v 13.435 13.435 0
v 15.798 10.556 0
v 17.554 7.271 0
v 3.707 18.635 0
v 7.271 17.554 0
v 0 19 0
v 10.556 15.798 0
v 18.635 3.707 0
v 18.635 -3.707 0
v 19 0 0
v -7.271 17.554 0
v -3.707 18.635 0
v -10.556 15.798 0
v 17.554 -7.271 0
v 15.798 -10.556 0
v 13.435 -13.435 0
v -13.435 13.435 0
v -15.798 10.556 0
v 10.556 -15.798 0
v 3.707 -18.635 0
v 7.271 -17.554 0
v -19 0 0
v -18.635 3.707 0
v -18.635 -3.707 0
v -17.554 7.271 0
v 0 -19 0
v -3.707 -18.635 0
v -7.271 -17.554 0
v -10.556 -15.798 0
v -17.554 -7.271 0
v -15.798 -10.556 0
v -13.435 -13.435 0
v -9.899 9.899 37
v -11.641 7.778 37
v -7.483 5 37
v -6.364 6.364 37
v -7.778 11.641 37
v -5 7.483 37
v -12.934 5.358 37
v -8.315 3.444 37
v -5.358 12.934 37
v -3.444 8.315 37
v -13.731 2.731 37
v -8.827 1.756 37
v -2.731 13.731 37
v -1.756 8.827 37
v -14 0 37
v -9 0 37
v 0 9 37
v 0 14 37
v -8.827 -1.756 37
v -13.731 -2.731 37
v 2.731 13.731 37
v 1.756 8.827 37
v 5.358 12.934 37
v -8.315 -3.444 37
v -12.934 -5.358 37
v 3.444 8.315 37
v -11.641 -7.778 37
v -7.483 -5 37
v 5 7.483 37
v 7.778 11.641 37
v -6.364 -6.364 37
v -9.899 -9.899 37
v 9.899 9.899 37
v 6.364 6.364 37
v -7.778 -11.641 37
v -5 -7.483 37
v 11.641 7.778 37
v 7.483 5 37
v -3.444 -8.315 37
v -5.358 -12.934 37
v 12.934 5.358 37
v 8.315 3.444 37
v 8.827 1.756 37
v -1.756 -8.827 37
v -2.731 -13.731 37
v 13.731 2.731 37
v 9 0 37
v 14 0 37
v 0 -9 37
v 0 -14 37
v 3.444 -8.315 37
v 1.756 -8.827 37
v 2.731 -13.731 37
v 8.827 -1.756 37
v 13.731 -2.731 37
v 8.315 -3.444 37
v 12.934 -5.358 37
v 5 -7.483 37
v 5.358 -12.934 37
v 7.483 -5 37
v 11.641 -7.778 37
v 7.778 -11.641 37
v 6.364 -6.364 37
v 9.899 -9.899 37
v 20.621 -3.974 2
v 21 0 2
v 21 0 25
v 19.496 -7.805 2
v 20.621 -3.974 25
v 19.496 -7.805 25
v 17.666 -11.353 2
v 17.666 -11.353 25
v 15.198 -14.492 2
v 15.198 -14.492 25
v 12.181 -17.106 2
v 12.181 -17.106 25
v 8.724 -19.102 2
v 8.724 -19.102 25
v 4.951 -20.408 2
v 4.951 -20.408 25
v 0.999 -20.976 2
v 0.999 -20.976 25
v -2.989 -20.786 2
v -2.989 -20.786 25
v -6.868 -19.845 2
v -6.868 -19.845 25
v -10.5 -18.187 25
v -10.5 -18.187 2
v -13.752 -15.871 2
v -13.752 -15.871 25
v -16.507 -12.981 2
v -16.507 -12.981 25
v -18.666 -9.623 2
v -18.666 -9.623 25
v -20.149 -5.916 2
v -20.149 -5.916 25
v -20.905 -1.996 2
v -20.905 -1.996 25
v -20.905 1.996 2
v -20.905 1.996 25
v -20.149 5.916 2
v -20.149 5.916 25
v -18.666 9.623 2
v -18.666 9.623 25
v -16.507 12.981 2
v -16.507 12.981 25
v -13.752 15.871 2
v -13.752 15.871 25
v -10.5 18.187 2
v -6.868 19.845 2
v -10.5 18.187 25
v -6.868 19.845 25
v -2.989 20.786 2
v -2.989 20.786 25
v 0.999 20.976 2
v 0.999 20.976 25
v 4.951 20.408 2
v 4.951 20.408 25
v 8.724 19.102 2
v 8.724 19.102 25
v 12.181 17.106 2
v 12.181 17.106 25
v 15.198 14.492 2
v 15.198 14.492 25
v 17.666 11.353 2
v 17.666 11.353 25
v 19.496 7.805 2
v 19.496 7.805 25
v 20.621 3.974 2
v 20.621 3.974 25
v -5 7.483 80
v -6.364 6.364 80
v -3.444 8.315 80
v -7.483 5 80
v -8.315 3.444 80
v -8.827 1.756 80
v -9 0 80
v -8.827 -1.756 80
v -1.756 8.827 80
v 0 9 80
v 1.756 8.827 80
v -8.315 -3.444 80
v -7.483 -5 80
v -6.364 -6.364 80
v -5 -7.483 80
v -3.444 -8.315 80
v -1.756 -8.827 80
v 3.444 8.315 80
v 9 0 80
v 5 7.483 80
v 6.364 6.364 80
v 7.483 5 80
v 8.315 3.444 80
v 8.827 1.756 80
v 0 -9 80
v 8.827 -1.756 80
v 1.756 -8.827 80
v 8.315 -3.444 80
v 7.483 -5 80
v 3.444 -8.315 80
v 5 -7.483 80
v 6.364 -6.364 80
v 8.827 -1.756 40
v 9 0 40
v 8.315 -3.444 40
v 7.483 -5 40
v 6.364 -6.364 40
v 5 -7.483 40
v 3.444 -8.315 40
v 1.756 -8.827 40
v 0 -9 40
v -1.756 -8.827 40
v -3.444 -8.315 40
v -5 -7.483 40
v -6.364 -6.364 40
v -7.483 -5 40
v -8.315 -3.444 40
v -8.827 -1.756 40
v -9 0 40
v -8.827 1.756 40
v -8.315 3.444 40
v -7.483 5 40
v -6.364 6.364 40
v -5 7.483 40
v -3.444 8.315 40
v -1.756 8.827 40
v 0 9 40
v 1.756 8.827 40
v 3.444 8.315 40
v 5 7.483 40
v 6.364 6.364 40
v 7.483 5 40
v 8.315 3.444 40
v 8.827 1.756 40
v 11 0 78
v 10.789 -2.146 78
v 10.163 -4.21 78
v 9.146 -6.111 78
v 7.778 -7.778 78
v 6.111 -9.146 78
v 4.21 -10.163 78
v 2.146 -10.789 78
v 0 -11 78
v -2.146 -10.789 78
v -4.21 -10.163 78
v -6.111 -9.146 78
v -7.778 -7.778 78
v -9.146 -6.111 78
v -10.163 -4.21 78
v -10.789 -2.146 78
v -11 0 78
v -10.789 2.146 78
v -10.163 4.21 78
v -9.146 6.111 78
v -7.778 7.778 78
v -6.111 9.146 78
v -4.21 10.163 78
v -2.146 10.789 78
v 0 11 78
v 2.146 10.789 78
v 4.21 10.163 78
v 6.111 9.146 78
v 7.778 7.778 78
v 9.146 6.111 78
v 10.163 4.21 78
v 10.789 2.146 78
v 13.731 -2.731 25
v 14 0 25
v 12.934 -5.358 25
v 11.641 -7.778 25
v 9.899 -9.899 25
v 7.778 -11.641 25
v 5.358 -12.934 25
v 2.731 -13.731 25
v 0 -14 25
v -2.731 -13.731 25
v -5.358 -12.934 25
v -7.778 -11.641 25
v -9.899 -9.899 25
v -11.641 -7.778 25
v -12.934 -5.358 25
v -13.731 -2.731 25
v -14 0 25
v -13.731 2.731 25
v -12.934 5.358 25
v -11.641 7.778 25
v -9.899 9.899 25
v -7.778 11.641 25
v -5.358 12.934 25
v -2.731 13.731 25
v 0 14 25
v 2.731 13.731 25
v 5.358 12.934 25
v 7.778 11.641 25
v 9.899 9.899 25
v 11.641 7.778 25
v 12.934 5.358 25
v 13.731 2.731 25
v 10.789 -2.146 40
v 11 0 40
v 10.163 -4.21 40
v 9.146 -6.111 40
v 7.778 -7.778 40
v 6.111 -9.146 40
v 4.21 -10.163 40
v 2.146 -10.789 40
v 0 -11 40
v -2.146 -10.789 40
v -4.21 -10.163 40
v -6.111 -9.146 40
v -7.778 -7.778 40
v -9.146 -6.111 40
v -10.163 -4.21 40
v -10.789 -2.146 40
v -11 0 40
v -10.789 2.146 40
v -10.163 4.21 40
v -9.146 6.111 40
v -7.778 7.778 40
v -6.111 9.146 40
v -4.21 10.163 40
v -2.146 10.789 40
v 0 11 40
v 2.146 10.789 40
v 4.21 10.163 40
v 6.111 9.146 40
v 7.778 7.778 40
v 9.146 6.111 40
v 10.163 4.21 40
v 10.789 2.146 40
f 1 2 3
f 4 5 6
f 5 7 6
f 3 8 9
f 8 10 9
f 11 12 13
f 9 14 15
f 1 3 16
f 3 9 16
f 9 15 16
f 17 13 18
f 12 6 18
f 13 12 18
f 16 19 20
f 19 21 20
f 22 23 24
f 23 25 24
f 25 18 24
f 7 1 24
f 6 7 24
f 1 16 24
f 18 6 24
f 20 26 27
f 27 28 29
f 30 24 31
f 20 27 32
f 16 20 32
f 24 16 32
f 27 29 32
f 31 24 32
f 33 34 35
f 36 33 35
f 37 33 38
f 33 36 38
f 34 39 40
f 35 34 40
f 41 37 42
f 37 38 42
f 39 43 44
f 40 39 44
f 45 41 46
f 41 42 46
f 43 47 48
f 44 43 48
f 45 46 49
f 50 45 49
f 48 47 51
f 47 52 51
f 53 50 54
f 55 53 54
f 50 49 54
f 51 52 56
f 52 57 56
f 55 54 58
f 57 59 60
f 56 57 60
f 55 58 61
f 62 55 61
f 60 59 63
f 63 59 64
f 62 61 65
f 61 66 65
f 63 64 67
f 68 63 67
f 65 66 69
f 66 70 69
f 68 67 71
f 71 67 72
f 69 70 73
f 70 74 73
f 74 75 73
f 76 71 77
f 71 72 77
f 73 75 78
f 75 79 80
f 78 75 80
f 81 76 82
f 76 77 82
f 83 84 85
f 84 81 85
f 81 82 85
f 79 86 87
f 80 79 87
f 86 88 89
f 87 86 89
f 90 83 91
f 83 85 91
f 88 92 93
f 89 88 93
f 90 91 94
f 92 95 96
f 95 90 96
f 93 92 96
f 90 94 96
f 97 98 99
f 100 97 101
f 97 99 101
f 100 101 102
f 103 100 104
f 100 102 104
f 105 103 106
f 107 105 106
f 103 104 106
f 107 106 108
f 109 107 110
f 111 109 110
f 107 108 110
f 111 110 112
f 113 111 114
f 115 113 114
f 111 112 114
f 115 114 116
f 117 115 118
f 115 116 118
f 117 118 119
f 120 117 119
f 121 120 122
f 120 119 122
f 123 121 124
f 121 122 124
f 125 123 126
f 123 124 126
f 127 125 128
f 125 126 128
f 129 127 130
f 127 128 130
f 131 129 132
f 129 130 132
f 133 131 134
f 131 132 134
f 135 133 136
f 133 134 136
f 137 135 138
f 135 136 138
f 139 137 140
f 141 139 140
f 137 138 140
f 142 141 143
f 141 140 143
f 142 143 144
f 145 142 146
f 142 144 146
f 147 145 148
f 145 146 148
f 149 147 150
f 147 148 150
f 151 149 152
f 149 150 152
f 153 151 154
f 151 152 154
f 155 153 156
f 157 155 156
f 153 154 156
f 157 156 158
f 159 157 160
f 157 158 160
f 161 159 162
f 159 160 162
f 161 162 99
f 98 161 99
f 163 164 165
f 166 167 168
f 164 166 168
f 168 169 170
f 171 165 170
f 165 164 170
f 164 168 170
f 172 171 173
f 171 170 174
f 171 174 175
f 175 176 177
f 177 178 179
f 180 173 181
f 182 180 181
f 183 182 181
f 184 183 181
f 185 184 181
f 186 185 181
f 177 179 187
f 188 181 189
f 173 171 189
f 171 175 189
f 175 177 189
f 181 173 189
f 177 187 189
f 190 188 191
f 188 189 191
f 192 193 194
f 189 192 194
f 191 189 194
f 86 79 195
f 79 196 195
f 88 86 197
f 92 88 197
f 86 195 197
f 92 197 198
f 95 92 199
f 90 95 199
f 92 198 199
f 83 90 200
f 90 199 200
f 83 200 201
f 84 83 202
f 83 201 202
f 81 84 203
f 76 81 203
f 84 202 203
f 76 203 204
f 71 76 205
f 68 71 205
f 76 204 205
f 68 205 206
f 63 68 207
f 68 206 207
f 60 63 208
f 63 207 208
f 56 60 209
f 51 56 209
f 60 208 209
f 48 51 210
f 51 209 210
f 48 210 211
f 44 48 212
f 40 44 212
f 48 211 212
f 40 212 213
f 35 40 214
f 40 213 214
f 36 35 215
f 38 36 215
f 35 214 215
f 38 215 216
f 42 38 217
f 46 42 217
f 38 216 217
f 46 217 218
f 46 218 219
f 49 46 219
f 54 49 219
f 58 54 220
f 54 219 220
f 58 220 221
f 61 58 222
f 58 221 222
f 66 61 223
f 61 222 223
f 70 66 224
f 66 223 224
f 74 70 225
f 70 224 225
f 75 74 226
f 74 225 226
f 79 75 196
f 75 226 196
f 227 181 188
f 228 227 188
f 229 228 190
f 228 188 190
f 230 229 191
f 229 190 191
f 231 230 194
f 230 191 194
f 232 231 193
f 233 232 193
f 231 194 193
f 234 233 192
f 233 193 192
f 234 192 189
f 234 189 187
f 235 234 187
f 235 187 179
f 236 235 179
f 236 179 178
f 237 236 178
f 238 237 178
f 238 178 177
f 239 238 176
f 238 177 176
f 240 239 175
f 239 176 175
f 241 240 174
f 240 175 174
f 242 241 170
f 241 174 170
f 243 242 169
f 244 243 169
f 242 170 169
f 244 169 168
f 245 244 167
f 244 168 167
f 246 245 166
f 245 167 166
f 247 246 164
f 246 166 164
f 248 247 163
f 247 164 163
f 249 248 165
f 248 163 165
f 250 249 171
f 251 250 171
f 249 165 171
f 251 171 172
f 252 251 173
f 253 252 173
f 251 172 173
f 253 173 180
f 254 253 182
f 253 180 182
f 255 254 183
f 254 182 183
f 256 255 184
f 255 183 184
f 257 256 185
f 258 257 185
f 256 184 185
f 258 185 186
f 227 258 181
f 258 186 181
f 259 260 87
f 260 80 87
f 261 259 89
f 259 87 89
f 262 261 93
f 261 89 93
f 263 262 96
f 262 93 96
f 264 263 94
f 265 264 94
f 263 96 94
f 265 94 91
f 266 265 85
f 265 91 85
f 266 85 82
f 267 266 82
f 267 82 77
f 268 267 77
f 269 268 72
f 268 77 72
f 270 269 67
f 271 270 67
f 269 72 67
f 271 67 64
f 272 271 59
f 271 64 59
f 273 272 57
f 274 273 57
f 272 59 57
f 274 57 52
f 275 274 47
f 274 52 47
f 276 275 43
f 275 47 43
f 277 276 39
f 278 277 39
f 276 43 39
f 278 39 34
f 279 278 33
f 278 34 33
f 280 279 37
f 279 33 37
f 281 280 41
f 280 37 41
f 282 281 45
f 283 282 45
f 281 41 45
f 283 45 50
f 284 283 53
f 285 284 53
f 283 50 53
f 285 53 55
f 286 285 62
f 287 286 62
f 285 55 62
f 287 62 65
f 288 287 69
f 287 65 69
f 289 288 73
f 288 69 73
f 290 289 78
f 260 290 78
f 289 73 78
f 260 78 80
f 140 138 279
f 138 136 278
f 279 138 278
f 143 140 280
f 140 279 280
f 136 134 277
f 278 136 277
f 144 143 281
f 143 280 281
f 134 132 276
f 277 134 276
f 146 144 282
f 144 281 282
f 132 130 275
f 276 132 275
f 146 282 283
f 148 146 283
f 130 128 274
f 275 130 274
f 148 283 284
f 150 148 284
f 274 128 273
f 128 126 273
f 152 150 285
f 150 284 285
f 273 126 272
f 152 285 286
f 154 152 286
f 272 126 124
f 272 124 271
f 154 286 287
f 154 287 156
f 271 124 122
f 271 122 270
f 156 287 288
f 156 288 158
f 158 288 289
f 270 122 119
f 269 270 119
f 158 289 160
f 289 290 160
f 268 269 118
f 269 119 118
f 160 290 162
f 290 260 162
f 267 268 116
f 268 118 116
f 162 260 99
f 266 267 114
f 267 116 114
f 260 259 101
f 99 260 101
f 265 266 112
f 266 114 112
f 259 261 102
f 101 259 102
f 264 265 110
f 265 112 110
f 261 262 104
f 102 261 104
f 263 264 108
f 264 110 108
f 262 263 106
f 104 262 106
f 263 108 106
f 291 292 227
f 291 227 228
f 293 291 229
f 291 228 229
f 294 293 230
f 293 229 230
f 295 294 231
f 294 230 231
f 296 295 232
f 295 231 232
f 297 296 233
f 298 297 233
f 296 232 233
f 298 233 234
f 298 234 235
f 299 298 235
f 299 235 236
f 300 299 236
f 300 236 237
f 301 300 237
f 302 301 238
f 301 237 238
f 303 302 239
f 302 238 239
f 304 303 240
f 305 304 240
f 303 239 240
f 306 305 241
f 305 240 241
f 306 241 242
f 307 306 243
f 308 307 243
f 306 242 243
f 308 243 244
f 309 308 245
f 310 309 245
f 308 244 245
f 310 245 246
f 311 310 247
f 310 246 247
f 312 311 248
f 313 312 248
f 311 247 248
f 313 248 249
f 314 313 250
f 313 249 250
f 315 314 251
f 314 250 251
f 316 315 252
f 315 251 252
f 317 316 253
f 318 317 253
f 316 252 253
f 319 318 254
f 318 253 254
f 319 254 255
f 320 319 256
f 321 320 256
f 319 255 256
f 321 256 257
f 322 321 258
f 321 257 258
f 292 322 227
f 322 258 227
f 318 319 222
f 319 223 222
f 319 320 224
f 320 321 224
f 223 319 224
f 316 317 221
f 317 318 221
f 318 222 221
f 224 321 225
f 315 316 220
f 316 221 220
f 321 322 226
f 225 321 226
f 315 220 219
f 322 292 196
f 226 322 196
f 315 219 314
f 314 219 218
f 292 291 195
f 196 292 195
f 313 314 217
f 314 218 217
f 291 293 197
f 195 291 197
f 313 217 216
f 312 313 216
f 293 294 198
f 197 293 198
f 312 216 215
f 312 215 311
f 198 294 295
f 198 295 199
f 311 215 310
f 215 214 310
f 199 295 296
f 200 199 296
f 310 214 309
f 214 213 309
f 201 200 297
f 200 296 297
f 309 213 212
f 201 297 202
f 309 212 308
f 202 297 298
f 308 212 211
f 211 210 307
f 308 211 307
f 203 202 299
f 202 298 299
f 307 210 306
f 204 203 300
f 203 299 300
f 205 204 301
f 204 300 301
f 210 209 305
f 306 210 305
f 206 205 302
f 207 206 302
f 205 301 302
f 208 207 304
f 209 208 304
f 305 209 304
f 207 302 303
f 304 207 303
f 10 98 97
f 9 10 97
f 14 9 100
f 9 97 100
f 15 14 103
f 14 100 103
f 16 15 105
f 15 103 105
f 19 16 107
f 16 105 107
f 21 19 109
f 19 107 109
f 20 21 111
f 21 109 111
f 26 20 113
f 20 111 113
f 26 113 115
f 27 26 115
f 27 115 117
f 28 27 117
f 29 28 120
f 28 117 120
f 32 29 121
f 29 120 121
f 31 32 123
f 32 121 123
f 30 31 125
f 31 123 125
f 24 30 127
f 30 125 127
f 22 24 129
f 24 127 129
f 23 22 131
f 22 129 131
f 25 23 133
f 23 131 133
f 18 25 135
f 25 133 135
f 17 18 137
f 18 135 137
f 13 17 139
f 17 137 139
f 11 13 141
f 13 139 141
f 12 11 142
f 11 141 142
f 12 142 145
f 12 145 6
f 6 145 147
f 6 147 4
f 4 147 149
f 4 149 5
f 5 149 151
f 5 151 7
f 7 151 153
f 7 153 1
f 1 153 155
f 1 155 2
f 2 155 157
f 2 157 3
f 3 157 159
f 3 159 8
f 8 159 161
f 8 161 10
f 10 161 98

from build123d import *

# Parameters (mm, degrees)
F2_SIZE2 = 2
F2_SIZE  = 2


with BuildPart() as f1:
    # F0 (on Front) → F1 (revolve)
    with BuildSketch(Plane.XZ):
        Polygon((0, 80), (0, 0), (21, 0), (21, 25), (14, 25), (14, 37), (9, 37), (9, 40), (11, 40), (11, 80), align=None)
    revolve(axis=Axis((0, 0, 40), (0, 0, -1)))

    # F2
    f2_edges = [f1.edges().sort_by_distance(p)[0] for p in [
        (-11, 0, 80),
        (-21, 0, 0),
    ]]
    chamfer(f2_edges, length=F2_SIZE, length2=F2_SIZE2)


solid = f1.part
